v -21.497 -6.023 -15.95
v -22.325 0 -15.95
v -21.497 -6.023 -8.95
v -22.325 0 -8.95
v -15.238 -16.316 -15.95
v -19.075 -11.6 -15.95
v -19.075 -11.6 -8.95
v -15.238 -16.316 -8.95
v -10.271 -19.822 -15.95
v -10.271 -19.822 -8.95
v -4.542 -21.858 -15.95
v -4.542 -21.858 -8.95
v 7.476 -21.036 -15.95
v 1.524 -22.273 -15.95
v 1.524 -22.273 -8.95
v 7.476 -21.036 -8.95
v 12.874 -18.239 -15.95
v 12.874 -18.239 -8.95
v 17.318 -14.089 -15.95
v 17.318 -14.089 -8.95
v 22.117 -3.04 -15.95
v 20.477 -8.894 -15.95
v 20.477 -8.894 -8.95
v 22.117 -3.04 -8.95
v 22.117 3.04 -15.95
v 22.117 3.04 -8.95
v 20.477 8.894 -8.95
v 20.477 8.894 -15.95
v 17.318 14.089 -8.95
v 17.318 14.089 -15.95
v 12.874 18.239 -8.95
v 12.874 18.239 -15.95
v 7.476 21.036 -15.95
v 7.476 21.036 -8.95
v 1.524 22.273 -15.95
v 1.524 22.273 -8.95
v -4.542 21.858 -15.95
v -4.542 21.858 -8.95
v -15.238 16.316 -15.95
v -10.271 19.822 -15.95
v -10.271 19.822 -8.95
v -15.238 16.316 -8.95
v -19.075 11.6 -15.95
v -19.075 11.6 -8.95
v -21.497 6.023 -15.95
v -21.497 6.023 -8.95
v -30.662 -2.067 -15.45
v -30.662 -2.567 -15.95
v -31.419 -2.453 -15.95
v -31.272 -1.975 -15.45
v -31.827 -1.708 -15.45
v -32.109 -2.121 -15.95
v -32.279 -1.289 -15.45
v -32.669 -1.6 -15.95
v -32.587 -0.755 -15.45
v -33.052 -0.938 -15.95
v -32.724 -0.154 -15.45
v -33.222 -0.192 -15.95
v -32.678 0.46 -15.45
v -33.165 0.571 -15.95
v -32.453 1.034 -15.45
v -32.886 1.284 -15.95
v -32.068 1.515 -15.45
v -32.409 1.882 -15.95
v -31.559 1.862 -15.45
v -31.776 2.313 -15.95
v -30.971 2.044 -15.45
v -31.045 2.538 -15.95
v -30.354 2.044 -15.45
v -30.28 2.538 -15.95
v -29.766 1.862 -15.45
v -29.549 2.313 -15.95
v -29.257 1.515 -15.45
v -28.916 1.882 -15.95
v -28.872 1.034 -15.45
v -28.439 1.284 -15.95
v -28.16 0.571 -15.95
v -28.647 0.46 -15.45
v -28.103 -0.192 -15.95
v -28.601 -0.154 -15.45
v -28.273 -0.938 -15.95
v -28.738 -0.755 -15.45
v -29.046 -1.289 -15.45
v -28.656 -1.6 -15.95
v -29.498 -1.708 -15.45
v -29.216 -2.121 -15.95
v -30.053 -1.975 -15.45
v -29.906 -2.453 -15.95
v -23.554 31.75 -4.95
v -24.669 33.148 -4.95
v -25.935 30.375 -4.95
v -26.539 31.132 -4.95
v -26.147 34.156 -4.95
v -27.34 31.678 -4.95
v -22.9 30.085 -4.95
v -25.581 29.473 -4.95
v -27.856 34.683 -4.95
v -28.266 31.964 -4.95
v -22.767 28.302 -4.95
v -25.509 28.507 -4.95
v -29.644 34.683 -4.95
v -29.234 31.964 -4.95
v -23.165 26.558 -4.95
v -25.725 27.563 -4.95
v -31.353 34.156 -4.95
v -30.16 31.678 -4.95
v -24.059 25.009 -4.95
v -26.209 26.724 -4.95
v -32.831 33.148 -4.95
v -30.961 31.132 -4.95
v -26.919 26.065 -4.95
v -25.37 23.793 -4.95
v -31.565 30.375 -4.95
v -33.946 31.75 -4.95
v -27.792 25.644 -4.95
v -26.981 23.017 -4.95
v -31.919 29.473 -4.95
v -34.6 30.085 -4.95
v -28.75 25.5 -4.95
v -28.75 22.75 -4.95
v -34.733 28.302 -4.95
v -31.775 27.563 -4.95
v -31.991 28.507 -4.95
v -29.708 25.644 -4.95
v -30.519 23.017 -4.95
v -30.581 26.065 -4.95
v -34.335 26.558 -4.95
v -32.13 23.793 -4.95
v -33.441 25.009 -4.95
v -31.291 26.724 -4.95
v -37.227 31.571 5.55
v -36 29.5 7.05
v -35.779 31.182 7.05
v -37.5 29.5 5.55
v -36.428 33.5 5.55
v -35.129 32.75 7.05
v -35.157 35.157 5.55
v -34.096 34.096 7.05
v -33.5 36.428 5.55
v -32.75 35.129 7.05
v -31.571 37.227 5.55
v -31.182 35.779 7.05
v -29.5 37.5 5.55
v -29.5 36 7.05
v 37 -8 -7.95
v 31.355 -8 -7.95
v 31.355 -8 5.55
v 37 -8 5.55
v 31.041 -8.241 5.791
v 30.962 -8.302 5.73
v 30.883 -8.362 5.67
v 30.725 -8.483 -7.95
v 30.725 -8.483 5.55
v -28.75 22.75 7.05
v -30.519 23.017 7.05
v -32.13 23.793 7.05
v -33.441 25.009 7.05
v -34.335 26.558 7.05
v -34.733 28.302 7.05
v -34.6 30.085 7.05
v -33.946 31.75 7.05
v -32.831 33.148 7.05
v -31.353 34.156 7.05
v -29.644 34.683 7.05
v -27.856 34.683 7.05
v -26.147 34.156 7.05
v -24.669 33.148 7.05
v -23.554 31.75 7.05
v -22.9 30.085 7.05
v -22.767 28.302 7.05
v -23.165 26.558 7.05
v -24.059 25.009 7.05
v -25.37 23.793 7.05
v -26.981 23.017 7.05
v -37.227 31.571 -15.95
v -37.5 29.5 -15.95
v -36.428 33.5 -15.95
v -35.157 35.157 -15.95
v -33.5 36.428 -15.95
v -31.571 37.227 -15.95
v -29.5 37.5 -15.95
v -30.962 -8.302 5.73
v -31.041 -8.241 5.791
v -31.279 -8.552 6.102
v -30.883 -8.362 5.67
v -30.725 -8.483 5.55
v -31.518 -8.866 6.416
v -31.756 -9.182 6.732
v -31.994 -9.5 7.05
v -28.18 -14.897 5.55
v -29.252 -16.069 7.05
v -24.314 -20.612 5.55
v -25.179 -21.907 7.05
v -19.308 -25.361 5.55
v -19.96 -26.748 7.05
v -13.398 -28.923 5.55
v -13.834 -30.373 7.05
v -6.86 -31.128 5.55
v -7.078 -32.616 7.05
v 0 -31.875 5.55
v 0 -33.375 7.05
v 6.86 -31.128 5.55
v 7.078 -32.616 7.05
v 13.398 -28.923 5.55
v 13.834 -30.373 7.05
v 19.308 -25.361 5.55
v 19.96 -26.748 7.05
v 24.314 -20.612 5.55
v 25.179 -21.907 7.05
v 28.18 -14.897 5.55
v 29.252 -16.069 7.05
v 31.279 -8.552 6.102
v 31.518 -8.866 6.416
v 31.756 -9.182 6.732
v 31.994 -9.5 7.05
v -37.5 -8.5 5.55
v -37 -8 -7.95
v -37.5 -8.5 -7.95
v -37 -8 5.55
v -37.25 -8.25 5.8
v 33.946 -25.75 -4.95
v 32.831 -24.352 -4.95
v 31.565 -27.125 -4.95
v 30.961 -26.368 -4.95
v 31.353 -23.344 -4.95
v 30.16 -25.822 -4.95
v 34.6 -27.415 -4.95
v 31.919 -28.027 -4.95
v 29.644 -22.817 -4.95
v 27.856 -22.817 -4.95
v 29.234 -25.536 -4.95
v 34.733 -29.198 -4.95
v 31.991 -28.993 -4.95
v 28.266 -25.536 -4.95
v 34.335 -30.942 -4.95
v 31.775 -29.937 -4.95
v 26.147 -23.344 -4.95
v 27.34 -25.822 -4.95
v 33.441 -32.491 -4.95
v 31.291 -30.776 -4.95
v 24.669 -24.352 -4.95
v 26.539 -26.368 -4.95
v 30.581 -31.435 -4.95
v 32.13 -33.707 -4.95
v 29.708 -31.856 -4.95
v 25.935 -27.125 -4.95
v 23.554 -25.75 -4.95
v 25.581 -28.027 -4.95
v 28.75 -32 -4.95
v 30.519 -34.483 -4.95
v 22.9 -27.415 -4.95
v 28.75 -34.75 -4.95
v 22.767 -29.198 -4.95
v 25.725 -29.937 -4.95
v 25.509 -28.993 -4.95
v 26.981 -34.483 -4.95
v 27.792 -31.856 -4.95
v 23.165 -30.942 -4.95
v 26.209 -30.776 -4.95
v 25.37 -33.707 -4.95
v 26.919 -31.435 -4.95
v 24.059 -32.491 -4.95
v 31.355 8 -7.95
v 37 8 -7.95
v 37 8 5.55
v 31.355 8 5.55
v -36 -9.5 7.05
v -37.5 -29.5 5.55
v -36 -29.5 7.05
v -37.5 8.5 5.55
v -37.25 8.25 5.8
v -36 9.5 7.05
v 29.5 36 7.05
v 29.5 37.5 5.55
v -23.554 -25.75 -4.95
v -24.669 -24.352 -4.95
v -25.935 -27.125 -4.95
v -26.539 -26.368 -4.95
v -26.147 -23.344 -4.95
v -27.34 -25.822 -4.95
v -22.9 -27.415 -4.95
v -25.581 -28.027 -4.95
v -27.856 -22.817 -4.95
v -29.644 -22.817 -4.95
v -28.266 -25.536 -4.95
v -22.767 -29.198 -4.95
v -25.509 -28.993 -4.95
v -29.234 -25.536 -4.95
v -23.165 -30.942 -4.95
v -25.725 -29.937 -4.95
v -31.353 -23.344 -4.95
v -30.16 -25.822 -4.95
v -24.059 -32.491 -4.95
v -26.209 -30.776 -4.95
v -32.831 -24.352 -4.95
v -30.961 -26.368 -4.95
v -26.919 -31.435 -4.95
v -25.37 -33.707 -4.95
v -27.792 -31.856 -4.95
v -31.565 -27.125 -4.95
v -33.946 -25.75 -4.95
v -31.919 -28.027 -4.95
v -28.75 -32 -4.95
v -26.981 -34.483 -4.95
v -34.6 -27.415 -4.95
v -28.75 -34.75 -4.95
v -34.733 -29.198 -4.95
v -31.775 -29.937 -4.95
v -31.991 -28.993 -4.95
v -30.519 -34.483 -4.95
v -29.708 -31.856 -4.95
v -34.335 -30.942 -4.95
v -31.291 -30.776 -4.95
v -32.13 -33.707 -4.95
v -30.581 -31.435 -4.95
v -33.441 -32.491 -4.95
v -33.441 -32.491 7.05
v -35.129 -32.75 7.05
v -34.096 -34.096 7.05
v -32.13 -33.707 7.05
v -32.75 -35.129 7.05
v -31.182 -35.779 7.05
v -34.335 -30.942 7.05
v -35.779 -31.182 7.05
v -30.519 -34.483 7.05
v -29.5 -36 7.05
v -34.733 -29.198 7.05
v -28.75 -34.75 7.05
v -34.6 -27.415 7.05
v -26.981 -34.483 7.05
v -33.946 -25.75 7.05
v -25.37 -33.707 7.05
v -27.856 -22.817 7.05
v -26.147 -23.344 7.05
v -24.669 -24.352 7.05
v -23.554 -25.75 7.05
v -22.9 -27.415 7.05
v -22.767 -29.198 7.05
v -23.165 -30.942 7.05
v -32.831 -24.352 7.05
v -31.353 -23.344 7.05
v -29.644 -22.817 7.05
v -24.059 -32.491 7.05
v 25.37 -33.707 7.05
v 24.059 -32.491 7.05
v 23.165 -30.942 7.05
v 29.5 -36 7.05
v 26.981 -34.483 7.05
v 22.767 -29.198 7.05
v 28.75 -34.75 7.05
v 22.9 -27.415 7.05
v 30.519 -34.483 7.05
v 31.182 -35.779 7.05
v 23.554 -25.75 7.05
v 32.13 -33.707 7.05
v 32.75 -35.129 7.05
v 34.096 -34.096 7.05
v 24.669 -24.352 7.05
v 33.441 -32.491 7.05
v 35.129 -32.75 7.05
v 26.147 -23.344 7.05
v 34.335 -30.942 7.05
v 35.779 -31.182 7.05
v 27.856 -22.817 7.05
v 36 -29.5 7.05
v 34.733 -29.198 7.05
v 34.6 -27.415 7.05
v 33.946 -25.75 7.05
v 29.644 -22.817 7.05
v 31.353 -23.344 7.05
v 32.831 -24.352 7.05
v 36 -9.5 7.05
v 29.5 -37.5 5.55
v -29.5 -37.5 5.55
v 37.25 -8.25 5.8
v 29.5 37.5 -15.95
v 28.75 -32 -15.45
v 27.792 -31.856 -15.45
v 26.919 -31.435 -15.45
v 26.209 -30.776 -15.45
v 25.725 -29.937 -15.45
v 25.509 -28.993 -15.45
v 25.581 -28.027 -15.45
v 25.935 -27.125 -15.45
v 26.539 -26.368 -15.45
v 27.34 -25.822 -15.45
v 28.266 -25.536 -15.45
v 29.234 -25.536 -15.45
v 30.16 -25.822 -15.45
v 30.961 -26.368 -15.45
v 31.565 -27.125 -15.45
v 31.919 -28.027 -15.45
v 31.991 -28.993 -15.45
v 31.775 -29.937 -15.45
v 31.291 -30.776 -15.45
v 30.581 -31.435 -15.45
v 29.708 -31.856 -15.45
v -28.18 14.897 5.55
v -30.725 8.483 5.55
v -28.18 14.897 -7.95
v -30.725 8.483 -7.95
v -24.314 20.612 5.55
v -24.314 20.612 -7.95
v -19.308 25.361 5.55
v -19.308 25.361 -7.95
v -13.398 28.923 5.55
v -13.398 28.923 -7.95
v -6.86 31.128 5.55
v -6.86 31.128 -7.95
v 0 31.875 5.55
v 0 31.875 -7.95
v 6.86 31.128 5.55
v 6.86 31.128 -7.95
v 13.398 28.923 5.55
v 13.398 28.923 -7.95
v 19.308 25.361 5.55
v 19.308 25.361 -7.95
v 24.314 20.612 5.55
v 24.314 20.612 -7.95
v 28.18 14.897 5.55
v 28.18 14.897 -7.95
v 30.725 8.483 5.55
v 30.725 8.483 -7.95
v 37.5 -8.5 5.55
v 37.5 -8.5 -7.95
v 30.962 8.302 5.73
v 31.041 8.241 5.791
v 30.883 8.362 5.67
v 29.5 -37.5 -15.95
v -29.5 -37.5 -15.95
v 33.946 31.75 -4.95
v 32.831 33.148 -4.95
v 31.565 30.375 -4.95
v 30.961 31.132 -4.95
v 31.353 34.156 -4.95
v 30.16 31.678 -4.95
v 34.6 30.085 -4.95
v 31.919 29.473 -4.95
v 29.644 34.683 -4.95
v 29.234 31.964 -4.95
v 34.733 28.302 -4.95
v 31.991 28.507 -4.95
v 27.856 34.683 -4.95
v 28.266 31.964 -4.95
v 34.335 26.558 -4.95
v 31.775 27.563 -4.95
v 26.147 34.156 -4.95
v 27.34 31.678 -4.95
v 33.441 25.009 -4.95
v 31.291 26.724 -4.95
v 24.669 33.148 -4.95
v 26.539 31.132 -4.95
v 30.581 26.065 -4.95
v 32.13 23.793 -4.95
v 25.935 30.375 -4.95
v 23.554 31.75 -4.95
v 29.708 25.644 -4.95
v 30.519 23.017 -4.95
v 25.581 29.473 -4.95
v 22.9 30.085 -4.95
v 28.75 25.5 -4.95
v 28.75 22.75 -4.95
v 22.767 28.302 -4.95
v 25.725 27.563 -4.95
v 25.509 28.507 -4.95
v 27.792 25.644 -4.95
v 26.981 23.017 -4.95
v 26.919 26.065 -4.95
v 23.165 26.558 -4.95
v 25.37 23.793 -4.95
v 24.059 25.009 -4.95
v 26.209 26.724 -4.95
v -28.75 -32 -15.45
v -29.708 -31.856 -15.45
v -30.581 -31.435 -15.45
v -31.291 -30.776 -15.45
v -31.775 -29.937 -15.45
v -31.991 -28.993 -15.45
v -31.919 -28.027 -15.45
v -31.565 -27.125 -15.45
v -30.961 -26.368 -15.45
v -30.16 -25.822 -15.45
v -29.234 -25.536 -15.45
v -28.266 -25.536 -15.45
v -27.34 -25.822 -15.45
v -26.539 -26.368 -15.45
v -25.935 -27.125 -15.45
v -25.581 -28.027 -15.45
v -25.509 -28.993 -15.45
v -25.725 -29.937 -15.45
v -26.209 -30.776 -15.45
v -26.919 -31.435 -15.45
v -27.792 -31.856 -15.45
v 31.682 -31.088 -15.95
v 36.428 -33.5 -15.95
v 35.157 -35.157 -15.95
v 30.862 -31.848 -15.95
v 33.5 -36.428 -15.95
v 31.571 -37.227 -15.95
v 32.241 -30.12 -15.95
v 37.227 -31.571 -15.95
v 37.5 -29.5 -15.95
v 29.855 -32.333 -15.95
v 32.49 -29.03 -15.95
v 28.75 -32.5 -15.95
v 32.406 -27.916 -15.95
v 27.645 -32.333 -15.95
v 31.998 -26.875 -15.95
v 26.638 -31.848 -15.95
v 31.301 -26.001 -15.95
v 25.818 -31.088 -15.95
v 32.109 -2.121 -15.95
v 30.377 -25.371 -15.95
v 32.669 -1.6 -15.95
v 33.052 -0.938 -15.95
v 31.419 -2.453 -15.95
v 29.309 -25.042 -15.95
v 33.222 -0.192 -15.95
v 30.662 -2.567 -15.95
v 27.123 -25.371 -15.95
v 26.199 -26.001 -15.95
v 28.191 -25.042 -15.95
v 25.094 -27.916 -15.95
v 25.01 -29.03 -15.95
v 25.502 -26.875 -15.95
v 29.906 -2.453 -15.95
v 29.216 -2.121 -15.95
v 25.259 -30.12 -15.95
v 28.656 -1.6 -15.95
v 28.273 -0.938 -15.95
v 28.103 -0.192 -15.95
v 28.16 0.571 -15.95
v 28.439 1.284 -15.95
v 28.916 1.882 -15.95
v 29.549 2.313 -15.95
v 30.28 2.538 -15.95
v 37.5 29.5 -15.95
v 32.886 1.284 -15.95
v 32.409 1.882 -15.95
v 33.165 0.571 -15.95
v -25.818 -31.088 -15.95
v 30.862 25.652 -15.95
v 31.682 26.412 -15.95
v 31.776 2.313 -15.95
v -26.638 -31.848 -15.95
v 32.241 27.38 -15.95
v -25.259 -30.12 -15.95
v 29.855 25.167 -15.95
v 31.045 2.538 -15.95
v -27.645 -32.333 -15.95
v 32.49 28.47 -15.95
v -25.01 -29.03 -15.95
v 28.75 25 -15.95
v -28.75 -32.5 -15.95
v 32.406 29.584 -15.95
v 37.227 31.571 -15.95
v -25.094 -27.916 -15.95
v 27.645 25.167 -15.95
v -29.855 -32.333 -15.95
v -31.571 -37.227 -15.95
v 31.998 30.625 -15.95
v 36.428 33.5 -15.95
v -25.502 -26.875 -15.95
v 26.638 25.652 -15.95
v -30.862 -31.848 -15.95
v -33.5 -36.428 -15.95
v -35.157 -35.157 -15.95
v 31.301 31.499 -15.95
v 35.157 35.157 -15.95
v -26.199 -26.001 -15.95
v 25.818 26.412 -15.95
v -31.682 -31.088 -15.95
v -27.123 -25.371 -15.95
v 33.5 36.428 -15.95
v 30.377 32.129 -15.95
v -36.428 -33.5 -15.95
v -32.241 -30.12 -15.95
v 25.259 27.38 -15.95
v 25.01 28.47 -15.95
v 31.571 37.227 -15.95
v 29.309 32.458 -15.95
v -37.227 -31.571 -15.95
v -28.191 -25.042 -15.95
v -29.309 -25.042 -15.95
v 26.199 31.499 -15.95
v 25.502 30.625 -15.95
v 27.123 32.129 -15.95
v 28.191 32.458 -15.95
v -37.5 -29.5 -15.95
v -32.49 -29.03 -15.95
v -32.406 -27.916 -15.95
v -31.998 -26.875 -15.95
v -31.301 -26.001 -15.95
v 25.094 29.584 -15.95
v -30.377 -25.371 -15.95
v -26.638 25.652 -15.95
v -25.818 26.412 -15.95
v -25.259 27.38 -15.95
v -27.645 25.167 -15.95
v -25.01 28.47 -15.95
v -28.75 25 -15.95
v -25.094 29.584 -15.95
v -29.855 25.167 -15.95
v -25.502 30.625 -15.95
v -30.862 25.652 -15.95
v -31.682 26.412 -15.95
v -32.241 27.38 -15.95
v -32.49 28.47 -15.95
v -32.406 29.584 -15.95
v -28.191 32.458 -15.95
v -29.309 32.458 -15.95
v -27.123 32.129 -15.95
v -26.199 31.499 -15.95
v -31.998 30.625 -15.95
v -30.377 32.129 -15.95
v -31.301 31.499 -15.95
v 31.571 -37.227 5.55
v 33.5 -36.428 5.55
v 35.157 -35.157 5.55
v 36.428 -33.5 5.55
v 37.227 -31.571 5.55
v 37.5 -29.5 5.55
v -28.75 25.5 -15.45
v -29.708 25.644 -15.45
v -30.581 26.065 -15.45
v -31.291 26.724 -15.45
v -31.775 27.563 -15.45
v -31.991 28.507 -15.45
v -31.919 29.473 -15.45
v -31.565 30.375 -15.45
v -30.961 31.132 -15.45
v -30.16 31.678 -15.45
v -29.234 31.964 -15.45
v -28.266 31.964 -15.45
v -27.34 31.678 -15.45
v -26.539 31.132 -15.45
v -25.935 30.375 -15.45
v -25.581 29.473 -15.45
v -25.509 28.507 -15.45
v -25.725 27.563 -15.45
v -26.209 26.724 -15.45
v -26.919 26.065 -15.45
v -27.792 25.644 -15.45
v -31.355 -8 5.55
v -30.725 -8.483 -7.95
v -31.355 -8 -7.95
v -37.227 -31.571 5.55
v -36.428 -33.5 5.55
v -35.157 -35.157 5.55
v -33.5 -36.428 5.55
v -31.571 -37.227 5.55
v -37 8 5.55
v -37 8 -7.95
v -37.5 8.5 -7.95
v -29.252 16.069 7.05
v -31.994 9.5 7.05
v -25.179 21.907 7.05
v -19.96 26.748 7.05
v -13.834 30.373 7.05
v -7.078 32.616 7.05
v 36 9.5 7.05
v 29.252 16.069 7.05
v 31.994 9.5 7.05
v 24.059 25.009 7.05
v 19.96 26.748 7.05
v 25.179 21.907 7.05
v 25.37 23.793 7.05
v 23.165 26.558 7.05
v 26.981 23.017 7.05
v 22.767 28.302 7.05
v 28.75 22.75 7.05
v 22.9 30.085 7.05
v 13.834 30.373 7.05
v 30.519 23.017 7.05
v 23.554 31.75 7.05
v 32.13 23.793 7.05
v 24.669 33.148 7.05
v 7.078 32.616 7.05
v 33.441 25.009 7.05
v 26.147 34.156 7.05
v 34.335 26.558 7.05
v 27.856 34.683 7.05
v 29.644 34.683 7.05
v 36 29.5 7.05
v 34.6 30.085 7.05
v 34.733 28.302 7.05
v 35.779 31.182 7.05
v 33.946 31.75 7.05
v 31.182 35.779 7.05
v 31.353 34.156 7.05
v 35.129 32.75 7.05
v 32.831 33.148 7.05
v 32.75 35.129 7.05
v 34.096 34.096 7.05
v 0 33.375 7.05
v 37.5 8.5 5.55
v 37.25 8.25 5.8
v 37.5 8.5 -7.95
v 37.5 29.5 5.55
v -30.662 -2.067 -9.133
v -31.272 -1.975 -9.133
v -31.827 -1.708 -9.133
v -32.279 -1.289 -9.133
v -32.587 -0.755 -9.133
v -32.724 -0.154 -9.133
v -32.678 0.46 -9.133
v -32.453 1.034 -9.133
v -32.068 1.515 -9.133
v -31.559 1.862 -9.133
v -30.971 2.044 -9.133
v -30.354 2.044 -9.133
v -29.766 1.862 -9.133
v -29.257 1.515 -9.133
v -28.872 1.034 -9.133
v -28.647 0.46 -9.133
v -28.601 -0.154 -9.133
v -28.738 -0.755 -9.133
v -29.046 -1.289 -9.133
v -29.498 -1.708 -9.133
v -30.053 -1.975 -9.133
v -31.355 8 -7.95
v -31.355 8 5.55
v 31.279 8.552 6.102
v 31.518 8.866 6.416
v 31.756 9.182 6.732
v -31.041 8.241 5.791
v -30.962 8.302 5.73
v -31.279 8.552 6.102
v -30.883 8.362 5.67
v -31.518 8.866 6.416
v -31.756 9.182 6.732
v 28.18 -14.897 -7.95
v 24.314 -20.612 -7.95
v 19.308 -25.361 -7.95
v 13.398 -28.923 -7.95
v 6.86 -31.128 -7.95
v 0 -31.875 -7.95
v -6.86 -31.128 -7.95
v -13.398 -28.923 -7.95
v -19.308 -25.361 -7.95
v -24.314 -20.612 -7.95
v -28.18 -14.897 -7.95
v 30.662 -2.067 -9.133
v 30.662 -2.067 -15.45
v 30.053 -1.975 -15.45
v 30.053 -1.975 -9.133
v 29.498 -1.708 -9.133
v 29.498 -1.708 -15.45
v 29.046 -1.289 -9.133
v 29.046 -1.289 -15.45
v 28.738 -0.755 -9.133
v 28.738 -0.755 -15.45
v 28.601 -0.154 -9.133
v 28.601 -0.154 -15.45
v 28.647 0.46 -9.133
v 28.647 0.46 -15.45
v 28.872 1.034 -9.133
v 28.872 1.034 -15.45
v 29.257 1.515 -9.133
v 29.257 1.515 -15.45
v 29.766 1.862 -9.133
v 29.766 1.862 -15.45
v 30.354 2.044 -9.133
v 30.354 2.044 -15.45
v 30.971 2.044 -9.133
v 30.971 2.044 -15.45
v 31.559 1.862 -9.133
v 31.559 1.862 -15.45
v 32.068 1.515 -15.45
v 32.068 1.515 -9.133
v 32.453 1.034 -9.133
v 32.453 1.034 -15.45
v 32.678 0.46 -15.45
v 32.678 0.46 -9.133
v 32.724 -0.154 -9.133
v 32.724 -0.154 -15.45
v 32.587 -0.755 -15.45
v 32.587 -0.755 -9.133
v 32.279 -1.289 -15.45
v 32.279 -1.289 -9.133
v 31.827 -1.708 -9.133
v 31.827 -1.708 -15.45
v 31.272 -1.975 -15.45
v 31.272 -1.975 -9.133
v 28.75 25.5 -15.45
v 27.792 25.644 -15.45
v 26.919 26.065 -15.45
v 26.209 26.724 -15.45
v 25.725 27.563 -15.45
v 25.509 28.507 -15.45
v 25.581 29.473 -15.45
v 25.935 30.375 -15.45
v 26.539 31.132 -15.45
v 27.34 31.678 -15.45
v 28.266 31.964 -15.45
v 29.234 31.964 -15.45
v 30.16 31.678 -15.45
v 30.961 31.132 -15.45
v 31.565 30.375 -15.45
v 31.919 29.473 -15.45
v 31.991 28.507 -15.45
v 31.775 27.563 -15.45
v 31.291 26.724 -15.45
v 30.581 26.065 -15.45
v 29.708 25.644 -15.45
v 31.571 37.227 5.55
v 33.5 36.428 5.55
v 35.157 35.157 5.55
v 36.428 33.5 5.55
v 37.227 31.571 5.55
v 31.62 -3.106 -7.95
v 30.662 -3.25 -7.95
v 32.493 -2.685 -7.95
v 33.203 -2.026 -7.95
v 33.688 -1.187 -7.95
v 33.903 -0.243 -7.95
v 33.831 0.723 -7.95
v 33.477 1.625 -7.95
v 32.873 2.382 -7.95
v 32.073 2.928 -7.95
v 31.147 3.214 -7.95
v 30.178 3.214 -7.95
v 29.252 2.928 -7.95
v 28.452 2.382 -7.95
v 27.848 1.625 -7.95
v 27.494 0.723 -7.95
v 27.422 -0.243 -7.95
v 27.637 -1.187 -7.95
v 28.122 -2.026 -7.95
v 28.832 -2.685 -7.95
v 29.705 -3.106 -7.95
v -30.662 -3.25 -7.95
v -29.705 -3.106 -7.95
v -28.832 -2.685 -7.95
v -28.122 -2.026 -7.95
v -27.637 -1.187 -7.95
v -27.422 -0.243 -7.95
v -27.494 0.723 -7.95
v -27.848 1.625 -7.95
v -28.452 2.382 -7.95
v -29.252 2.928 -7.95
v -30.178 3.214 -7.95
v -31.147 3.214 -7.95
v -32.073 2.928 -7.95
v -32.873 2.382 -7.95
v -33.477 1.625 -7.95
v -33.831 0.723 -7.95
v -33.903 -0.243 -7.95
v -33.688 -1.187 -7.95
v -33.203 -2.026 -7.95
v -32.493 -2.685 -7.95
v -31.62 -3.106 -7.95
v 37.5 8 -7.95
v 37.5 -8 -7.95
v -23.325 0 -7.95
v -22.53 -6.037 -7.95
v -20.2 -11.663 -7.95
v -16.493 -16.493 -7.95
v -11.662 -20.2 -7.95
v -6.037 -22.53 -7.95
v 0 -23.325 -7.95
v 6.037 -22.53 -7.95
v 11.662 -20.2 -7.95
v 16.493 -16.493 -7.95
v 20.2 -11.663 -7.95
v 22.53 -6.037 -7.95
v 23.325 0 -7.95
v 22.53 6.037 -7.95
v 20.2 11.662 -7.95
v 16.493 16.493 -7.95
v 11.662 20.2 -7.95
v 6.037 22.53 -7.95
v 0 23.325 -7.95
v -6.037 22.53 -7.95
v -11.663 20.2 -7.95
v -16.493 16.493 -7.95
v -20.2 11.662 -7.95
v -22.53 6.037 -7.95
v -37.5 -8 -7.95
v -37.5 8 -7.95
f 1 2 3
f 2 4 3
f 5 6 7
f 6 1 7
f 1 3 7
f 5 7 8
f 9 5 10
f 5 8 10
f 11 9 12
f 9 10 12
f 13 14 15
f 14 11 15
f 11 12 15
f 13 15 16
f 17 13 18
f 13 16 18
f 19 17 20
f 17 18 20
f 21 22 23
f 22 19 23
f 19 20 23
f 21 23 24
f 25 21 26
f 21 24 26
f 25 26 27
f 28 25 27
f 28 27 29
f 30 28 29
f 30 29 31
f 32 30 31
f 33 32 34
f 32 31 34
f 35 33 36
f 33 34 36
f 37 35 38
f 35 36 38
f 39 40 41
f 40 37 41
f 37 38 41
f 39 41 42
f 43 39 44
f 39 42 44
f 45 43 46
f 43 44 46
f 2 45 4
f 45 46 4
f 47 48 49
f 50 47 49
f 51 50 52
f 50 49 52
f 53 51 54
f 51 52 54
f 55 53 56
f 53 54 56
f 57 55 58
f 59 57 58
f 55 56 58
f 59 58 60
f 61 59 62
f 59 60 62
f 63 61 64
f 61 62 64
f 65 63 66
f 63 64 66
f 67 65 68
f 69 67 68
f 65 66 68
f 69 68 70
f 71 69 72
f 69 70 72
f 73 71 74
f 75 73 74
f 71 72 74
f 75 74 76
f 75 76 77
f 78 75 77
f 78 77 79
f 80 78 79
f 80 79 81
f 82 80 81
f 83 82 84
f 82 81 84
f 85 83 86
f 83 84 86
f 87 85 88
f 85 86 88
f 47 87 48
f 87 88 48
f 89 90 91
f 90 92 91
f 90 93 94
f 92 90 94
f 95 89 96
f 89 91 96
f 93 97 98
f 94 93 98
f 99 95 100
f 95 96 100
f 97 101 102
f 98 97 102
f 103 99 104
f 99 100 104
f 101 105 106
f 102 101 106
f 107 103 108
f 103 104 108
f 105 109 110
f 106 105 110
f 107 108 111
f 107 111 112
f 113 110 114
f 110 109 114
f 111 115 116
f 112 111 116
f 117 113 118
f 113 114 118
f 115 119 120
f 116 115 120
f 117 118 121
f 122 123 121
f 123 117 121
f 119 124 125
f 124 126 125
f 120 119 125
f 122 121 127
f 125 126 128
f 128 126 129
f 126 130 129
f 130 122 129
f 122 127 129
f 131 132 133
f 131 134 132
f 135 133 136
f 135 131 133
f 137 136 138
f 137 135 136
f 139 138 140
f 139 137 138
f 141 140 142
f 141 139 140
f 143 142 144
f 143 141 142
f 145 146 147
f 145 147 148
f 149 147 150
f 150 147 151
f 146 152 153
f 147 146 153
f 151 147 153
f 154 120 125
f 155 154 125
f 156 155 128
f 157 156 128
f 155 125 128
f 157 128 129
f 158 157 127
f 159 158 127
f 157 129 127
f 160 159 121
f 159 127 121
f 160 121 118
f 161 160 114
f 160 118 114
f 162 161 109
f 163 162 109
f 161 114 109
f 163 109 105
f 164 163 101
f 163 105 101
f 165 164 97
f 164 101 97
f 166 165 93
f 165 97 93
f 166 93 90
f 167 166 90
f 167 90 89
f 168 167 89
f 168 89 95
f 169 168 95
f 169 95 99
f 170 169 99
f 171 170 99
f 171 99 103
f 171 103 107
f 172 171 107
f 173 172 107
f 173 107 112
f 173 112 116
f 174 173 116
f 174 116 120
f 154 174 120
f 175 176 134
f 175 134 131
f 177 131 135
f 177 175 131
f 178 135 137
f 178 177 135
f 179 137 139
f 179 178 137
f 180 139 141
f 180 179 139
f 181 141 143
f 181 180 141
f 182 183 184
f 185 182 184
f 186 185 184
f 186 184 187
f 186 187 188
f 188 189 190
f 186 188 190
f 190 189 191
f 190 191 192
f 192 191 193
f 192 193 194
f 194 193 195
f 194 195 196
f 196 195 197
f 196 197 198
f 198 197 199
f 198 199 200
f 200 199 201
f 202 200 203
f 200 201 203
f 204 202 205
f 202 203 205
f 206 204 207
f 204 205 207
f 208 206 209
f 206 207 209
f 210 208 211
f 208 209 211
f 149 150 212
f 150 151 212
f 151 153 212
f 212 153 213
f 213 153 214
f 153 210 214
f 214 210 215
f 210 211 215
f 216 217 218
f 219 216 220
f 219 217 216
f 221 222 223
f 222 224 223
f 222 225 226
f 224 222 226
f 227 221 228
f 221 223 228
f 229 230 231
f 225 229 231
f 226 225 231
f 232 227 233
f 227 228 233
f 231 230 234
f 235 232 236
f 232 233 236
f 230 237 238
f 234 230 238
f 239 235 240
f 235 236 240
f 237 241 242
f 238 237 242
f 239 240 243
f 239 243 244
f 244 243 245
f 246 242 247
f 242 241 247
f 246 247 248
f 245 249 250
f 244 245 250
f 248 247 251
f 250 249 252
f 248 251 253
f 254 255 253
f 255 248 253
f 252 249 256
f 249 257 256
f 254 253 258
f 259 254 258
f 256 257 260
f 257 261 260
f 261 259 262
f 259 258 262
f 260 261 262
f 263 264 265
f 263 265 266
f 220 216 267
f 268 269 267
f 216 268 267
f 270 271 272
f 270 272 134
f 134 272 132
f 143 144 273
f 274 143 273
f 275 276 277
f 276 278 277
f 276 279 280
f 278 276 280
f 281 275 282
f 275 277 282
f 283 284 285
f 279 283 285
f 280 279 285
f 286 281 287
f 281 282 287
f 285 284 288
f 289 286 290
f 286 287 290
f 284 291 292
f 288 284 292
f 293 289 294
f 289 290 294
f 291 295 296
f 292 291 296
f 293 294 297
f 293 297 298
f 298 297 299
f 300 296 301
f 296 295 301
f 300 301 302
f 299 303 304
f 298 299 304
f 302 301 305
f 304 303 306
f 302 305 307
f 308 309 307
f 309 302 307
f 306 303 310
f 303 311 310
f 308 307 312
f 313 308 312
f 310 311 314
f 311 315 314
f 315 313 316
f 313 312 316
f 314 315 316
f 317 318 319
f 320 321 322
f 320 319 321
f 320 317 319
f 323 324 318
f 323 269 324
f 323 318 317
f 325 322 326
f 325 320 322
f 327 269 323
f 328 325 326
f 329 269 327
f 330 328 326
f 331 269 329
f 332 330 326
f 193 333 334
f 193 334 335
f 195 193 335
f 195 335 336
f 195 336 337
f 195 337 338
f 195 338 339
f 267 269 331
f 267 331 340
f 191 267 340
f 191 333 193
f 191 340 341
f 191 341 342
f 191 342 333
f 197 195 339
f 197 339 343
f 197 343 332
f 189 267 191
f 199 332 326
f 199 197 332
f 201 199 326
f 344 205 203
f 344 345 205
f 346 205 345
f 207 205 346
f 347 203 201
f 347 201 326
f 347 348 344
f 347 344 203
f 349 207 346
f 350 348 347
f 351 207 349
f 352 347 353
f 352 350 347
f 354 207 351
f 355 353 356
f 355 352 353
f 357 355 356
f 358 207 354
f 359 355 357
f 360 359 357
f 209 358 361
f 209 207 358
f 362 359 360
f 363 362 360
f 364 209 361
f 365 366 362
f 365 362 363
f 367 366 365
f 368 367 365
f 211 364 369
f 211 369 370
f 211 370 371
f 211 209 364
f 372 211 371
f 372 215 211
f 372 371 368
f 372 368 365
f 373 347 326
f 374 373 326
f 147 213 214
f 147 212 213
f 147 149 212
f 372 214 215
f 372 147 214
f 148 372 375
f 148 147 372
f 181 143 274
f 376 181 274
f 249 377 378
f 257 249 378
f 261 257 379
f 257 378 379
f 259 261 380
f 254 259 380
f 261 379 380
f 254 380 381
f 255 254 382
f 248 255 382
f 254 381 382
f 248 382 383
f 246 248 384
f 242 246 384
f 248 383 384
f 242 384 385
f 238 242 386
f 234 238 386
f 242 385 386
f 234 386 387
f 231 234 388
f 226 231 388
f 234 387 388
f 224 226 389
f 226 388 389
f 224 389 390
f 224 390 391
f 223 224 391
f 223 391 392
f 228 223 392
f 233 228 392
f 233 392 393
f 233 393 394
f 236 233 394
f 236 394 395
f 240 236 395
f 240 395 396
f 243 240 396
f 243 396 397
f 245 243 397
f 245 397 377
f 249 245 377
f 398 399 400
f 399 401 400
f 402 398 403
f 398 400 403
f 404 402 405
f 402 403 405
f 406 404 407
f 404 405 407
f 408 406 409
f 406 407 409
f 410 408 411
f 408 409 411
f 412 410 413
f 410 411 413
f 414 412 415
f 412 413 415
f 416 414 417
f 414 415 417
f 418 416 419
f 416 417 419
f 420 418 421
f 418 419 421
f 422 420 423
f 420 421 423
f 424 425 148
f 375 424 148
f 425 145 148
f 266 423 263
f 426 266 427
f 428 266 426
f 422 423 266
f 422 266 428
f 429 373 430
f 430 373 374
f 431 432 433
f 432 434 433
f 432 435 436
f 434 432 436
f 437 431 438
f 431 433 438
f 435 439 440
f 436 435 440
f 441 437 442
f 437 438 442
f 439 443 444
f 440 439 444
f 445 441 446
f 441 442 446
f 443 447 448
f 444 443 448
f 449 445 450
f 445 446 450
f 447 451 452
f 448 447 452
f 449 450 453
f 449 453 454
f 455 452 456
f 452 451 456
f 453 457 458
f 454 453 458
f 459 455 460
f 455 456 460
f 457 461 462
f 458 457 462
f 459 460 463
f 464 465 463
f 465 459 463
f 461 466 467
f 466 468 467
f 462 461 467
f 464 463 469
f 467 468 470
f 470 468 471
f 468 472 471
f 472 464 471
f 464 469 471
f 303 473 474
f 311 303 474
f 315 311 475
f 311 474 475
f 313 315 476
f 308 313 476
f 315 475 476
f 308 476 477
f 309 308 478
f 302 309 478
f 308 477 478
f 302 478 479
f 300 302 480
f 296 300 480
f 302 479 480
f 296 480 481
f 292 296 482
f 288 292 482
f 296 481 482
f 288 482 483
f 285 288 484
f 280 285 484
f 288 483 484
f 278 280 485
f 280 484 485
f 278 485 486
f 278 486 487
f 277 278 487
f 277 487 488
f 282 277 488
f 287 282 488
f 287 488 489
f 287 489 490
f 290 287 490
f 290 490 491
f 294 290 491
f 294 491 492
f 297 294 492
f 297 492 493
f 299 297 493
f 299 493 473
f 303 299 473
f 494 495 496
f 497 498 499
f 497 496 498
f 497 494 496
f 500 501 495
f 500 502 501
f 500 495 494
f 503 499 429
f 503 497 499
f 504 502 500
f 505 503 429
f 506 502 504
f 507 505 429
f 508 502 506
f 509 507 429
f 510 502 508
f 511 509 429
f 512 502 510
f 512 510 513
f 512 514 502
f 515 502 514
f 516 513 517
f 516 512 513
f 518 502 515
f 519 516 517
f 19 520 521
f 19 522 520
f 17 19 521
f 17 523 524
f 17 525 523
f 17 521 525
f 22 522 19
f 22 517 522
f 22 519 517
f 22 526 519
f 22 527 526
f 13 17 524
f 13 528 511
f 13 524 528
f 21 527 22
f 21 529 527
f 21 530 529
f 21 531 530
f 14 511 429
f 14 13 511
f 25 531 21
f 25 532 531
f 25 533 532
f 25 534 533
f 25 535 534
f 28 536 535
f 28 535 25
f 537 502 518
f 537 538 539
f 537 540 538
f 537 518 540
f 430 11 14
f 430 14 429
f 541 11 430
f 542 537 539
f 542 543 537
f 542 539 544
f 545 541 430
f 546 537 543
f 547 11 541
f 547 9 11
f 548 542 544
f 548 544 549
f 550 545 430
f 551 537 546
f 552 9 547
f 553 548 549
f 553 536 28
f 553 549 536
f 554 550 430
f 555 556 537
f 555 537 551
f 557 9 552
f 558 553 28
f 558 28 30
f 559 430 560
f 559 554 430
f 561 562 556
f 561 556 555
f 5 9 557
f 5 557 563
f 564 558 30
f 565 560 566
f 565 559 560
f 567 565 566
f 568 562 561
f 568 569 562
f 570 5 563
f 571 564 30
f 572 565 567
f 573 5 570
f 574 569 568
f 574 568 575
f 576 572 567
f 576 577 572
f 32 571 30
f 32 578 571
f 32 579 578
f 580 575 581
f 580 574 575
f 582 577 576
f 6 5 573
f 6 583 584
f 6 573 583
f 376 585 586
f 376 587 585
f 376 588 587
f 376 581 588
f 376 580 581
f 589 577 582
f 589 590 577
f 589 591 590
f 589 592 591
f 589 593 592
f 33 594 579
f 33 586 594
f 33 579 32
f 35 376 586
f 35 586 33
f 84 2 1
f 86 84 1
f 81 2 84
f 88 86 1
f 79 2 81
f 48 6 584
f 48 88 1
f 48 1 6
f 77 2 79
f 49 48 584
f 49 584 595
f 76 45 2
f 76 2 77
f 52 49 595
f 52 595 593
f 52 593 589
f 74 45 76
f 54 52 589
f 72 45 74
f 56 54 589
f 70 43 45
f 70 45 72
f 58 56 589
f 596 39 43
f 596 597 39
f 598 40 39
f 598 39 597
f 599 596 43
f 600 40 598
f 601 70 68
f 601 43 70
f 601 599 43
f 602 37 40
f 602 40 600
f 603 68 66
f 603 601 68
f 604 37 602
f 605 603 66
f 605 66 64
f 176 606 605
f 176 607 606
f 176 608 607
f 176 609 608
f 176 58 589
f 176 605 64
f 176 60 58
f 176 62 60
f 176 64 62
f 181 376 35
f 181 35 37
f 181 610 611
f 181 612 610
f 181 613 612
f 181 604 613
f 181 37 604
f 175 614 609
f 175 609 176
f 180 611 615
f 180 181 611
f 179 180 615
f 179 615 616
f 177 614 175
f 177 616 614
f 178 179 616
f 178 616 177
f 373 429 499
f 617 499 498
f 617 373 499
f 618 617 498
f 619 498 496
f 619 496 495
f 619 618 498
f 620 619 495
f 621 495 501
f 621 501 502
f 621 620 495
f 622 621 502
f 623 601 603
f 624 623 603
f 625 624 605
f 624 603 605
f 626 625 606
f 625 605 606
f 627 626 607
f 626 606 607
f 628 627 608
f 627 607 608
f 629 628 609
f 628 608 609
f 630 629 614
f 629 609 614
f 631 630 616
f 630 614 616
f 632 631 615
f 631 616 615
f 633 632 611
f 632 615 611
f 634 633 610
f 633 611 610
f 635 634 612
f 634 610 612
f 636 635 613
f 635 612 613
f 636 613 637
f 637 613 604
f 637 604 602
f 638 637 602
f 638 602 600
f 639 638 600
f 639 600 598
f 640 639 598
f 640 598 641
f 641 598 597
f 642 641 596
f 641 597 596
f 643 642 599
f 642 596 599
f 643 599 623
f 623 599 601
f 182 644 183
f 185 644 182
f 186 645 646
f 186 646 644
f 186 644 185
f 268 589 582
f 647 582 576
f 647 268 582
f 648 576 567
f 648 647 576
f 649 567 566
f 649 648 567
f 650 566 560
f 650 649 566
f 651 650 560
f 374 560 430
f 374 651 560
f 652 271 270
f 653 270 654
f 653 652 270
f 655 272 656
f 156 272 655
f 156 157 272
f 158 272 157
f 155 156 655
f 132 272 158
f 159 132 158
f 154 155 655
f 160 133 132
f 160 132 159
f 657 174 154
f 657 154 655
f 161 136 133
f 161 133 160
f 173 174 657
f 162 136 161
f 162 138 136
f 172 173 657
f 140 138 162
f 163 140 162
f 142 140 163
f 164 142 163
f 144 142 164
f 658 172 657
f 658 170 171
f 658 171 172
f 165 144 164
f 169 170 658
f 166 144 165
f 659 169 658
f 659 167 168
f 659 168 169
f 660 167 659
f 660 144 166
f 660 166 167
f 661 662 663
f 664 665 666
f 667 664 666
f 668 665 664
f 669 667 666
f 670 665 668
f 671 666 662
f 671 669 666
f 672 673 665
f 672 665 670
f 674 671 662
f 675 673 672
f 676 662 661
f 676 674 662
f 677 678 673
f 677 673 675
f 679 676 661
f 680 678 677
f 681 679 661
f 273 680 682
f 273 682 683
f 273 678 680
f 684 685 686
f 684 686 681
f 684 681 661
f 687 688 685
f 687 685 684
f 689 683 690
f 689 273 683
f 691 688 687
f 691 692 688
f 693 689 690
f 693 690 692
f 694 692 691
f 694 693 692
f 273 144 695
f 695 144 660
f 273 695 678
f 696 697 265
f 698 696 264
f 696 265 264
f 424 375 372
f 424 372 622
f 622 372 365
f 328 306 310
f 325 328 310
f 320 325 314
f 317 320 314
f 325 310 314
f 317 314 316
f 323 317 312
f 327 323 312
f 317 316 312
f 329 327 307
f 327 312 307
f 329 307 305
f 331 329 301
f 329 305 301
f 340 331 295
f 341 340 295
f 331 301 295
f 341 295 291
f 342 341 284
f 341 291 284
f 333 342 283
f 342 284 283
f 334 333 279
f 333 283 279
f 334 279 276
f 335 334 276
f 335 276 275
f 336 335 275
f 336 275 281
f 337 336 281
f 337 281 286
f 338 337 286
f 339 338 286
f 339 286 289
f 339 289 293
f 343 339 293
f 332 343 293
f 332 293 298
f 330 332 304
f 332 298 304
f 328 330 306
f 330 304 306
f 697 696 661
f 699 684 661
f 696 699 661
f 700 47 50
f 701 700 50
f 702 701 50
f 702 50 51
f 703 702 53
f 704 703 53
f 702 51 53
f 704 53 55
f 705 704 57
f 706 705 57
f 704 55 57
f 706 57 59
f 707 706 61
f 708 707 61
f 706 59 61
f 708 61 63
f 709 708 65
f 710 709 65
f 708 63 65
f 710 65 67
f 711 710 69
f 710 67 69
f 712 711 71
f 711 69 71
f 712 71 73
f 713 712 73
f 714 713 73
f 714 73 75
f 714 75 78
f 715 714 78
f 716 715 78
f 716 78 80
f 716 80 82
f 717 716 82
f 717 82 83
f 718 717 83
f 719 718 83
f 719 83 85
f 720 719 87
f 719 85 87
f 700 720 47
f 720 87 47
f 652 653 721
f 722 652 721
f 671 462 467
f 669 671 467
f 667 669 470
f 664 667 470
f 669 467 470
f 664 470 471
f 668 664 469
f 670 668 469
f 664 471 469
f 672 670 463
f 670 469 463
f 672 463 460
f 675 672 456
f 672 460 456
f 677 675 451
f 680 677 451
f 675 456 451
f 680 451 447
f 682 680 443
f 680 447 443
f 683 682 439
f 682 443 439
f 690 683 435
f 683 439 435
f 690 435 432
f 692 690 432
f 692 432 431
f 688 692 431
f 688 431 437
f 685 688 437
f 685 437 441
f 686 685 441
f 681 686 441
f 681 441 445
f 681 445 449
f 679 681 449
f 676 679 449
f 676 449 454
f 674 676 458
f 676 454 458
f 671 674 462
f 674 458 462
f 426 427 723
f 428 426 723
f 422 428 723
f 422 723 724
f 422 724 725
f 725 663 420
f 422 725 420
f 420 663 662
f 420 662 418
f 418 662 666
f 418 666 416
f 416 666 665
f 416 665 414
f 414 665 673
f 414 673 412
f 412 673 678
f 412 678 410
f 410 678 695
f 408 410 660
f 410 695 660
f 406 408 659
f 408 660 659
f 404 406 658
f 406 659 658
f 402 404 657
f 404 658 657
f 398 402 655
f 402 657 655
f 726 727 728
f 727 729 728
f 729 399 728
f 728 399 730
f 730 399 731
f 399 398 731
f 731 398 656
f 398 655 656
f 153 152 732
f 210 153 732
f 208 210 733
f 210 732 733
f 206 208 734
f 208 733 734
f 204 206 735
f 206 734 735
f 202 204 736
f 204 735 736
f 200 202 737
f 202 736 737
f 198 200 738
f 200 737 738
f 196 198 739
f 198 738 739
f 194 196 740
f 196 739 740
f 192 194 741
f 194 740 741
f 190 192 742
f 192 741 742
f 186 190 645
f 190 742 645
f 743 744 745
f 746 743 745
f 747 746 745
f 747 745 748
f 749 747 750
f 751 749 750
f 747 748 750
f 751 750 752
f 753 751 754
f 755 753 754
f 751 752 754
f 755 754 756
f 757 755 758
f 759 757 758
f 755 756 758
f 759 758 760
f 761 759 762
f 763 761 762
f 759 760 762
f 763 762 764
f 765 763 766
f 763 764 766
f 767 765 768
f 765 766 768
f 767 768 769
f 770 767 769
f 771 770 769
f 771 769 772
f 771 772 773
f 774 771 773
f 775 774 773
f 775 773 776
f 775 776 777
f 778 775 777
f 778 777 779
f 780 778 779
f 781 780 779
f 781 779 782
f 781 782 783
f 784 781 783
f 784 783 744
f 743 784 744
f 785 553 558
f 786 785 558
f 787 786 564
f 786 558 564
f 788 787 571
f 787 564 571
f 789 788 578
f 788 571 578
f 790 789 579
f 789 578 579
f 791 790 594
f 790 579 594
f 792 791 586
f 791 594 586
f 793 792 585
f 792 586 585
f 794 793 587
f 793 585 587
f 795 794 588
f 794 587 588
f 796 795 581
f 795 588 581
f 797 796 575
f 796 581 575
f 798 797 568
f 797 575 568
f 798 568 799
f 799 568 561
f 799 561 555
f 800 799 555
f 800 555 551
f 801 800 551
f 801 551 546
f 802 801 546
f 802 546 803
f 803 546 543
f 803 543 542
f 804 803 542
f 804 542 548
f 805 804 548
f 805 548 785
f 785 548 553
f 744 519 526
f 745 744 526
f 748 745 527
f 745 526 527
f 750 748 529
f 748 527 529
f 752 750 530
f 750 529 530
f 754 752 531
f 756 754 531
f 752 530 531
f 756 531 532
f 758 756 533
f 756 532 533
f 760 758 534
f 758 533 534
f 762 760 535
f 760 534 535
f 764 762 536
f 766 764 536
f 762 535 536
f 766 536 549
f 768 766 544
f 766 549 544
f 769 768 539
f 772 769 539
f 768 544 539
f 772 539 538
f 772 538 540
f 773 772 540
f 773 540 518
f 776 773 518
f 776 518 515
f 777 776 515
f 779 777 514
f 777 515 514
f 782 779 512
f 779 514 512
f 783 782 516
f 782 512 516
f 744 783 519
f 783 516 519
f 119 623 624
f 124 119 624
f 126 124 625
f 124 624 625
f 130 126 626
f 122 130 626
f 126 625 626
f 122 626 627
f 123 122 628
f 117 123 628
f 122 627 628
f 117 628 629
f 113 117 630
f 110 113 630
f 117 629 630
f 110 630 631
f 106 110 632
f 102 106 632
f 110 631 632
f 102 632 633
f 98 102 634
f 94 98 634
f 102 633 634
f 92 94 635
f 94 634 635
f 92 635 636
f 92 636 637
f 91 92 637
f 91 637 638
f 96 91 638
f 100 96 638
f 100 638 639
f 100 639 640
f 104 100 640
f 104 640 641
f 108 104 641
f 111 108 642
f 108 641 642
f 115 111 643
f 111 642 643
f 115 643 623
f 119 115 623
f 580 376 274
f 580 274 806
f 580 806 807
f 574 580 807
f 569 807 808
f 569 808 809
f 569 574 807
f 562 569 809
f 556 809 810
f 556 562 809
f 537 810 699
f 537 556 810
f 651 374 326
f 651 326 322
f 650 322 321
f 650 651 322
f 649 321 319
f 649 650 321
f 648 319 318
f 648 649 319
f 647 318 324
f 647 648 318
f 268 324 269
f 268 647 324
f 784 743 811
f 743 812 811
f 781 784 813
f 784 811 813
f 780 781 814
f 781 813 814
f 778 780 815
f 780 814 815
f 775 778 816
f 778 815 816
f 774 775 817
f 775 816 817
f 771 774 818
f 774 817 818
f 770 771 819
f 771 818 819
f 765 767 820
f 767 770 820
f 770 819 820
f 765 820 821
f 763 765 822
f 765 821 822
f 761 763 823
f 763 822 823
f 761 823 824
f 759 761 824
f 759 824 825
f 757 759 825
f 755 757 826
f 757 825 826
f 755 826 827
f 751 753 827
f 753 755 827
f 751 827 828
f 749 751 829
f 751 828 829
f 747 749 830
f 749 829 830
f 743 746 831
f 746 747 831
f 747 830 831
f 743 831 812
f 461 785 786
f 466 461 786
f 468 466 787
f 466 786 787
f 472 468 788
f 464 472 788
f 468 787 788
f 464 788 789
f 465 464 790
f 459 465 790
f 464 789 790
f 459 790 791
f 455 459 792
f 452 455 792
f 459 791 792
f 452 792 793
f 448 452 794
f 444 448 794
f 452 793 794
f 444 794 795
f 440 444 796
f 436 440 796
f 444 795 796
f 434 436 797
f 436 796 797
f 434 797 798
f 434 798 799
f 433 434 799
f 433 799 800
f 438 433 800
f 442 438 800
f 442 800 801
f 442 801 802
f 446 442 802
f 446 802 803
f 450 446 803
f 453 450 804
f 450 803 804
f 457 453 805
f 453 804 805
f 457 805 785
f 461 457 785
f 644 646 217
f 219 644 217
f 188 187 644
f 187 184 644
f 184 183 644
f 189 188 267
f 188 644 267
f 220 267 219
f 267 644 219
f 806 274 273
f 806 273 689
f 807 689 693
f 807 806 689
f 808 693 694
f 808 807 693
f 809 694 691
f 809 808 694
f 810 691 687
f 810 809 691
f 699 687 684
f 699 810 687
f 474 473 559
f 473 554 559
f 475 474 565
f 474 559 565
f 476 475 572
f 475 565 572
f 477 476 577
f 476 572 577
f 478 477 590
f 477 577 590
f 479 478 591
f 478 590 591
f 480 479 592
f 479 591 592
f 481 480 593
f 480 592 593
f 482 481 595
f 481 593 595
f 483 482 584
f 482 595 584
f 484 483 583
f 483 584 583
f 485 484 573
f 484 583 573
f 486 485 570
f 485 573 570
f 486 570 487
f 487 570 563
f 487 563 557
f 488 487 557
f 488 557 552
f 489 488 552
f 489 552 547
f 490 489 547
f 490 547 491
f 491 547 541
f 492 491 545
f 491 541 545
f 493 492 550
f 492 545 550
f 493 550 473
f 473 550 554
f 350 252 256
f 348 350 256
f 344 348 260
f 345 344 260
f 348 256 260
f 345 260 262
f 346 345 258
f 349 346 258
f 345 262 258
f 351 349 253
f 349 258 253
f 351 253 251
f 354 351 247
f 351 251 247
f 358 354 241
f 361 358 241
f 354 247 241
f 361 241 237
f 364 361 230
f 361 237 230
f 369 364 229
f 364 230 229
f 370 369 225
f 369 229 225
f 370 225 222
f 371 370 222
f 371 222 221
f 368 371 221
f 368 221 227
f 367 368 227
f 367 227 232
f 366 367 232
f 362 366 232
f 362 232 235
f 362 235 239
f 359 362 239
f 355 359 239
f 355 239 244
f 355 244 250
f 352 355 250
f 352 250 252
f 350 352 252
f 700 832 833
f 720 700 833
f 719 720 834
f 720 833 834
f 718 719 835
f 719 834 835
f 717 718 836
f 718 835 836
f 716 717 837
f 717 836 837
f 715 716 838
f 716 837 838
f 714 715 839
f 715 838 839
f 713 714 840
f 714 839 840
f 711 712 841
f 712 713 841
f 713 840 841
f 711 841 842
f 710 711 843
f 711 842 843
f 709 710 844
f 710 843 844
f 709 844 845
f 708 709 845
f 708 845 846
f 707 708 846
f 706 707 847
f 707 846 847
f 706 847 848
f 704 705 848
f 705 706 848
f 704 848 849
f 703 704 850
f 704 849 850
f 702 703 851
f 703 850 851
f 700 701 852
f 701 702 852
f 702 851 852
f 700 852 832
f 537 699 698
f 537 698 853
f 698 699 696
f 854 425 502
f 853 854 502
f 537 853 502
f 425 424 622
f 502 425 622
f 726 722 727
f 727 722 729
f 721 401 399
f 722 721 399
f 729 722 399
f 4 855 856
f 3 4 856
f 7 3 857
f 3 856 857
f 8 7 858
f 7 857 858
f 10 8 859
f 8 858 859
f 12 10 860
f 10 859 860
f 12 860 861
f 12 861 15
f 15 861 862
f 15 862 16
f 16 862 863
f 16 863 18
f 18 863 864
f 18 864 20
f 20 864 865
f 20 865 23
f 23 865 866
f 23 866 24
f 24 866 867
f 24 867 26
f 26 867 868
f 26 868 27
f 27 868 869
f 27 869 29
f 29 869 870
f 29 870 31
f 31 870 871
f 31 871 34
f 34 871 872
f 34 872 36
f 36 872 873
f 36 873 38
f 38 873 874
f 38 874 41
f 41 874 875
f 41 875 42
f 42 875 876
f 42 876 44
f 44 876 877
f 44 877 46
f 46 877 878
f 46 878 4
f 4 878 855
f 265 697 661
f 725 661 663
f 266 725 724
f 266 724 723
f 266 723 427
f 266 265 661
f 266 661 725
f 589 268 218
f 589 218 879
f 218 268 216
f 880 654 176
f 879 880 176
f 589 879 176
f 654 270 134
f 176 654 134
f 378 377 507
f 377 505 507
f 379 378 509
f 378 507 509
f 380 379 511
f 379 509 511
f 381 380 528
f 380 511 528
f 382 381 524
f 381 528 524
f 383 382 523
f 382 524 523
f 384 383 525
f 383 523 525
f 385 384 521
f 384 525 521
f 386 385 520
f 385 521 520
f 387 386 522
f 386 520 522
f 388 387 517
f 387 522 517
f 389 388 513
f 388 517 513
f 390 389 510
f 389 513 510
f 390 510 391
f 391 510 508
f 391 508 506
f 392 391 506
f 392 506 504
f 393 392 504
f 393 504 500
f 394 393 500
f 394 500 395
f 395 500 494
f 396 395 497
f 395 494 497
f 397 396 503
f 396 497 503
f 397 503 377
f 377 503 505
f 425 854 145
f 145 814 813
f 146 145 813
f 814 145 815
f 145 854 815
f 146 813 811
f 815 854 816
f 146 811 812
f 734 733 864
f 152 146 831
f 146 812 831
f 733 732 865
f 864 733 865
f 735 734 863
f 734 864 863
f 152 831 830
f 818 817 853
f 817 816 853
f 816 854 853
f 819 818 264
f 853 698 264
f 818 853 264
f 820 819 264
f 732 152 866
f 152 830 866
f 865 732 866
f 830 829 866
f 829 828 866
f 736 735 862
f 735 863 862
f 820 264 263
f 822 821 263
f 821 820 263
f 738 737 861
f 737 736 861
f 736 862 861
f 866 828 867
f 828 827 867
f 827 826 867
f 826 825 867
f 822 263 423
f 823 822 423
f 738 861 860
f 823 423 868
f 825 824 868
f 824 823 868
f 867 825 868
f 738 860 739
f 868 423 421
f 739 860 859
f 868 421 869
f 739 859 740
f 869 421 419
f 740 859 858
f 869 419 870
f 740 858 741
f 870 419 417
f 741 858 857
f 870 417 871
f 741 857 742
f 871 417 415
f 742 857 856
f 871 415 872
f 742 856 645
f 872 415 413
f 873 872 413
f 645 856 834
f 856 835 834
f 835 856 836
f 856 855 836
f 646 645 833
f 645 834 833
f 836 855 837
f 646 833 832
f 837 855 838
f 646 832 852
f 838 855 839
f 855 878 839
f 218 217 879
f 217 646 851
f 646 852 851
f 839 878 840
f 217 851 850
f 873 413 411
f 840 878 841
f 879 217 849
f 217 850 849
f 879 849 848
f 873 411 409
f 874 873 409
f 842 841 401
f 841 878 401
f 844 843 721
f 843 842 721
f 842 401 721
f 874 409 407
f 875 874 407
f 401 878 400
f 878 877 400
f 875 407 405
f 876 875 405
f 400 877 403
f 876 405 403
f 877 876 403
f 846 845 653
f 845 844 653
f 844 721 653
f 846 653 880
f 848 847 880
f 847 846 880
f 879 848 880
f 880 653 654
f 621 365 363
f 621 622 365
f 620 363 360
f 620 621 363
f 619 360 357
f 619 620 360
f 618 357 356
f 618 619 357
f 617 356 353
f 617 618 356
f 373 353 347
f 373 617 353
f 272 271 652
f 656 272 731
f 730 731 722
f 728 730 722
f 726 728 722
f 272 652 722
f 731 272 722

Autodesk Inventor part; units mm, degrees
ref_plane "YZ Plane" through (0, 0, 0) normal (1, 0, 0) x (0, 1, 0)
ref_plane "XZ Plane" through (0, 0, 0) normal (0, 1, 0) x (-1, 0, 0)
ref_plane "Work Plane1" through (31.775, 0, -7.95) normal (0, 0, -1) x (-1, 0, 0)
sketch "Sketch1" plane through (31.775, 0, -7.95) normal (0, 0, -1) x (-1, 0, 0)
  line L0 (62.5134, -8.05) -> (55.6, -8.05) construction
  line L1 (55.6, -8.05) -> (55.6, 8.05) construction
  line L2 (55.6, 8.05) -> (62.5134, 8.05) construction
  arc A0 (62.5134, 8.05) -> (1.0366, 8.05) centre (31.775, 0) ccw construction
  line L3 (1.0366, 8.05) -> (7.95, 8.05) construction
  line L4 (7.95, 8.05) -> (7.95, -8.05) construction
  line L5 (7.95, -8.05) -> (1.0366, -8.05) construction
  arc A1 (1.0366, -8.05) -> (62.5134, -8.05) centre (31.775, 0) ccw construction
  circle A2 centre (31.775, 0) radius 22.225 construction
  circle A3 centre (31.775, 0) radius 22.325
  line L6 (69.275, 37.5) -> (-5.725, 37.5)
  line L7 (-5.725, 37.5) -> (-5.725, -37.5)
  line L8 (-5.725, -37.5) -> (69.275, -37.5)
  line L9 (69.275, -37.5) -> (69.275, 37.5)
  line L10 (69.275, 37.5) -> (-5.725, -37.5) construction
  line L11 (-5.725, 37.5) -> (69.275, -37.5) construction
  dimension "d0" = 0.1
  dimension "d1" = 44.65
  dimension "d2" = 75
extrude "Extrusion1" add sketch "Sketch1" along normal blind 8
sketch "Sketch2" plane through (31.775, 0, -7.95) normal (0, 0, 1) x (1, 0, 0)
  line L0 (-62.5134, -8.05) -> (-55.6, -8.05) construction
  line L1 (-55.6, -8.05) -> (-55.6, 8.05) construction
  line L2 (-55.6, 8.05) -> (-62.5134, 8.05) construction
  arc A0 (-1.0366, 8.05) -> (-62.5134, 8.05) centre (-31.775, 0) ccw construction
  line L3 (-1.0366, 8.05) -> (-7.95, 8.05) construction
  line L4 (-7.95, 8.05) -> (-7.95, -8.05) construction
  line L5 (-7.95, -8.05) -> (-1.0366, -8.05) construction
  arc A1 (-62.5134, -8.05) -> (-1.0366, -8.05) centre (-31.775, 0) ccw construction
  circle A2 centre (-31.775, 0) radius 22.225 construction
  line L6 (5.725, 37.5) -> (5.725, -37.5) projected
  line L7 (-69.275, 37.5) -> (5.725, 37.5) projected
  line L8 (-69.275, -37.5) -> (-69.275, 37.5) projected
  line L9 (5.725, -37.5) -> (-69.275, -37.5) projected
  circle A3 centre (-31.775, 0) radius 22.325 construction
  circle A4 centre (-31.775, 0) radius 31.875
  line L10 (-55.6, -8) -> (-69.275, -8)
  line L11 (-69.275, -8) -> (-69.275, 8)
  line L12 (-69.275, 8) -> (-55.6, 8)
  line L13 (-55.6, 8) -> (-55.6, -8)
  line L14 (-84.275, 0) -> (20.725, 0) construction
  line L15 (-31.775, -52.5) -> (-31.775, 52.5) construction
  line L16 (-1.0366, -8.05) -> (-7.95, -8.05) construction
  line L17 (-7.95, -8.05) -> (-7.95, 8.05) construction
  line L18 (-7.95, 8.05) -> (-1.0366, 8.05) construction
  line L19 (-7.95, -8) -> (5.725, -8)
  line L20 (5.725, -8) -> (5.725, 8)
  line L21 (5.725, 8) -> (-7.95, 8)
  line L22 (-7.95, 8) -> (-7.95, -8)
  point P0 (-62.6298, 8)
  point P1 (-62.6298, -8)
  point P2 (-0.9202, 8)
  point P3 (5.725, 8)
  point P4 (5.725, -8)
  point P5 (-0.9202, -8)
  dimension "d7" = 0.1
  dimension "d9" = 0
  dimension "d29" = 0.05
extrude "Extrusion2" add sketch "Sketch2" along normal blind 15 contours L6 L21 A4 L12 L8 L7 | L6 L9 L8 L10 A4 L19
sketch "Sketch3" plane through (31.775, 0, 7.05) normal (0, 0, 1) x (1, 0, 0)
  line L0 (-3.025, -28.75) -> (-60.525, -28.75)
  line L1 (-60.525, -28.75) -> (-60.525, 28.75)
  line L2 (-60.525, 28.75) -> (-3.025, 28.75)
  line L3 (-3.025, 28.75) -> (-3.025, -28.75)
  line L4 (-3.025, -28.75) -> (-60.525, 28.75) construction
  line L5 (-60.525, -28.75) -> (-3.025, 28.75) construction
  point P0 (-31.775, 0)
  dimension "d12" = 57.5
hole "Hole1" at (-28.75, 28.75, 7.05) at (28.75, 28.75, 7.05) at (28.75, -28.75, 7.05) at (-28.75, -28.75, 7.05) direction (0, 0, -1) diameter 6.5 end through all counterbore diameter 12 counterbore depth 12
sketch "Sketch4" plane through (31.775, 0, -7.95) normal (0, 0, 1) x (1, 0, 0)
  circle A0 centre (-31.775, 0) radius 22.325 construction
  line L0 (5.725, 8) -> (-0.9202, 8) construction
  arc A1 (-0.9202, 8) -> (-62.6298, 8) centre (-31.775, 0) ccw construction
  line L1 (-62.6298, 8) -> (-69.275, 8) construction
  line L2 (-69.275, -8) -> (-69.275, 8) construction
  line L3 (-69.275, -8) -> (-62.6298, -8) construction
  arc A2 (-62.6298, -8) -> (-0.9202, -8) centre (-31.775, 0) ccw construction
  line L4 (-0.9202, -8) -> (5.725, -8) construction
  line L5 (5.725, 8) -> (5.725, -8) construction
  line L6 (5.725, 8) -> (-7.95, 8) construction
  line L7 (-7.95, -8) -> (5.725, -8) construction
  line L8 (5.725, -8) -> (5.725, 8) construction
  line L9 (-31.775, 0) -> (-9.45, 0) construction
  line L10 (-9.45, 0) -> (5.725, 0) construction
  line L11 (-1.1125, 8) -> (-1.1125, -8) construction
  line L12 (-0.9202, -8) -> (5.725, -8) construction
  line L13 (-31.775, -52.5) -> (-31.775, 52.5) construction
  line L14 (-7.95, -8) -> (-7.95, 8)
  line L15 (-7.95, 8.05) -> (-7.95, -8.05) projected
  point P0 (-1.1125, 0)
  point P1 (-62.4375, 0)
  dimension "d28" = 0
hole "Hole2" at (30.6625, 0, -7.95) at (-30.6625, 0, -7.95) direction (0, 0, -1) diameter 4.134 end through all countersink diameter 6.5 countersink angle 90 thread size "M5x0.8" class "6H" standard "ISO Metric profile"
fillet "Fillet1" radius 8 4 edges at (-37.5, -37.5, -4.45) (-37.5, 37.5, -4.45) (37.5, 37.5, -4.45) (37.5, -37.5, -4.45)
chamfer "Chamfer1" distance 1.5 angle 45 16 edges at (0, 31.875, 7.05) (0, -31.875, 7.05) (34.1774, 8, 7.05) (-34.1774, 8, 7.05) (-34.1774, -8, 7.05) (-37.5, -18.75, 7.05) (-35.1569, -35.1569, 7.05) (0, -37.5, 7.05) (35.1569, -35.1569, 7.05) (37.5, -18.75, 7.05) (-37.5, 18.75, 7.05) (-35.1569, 35.1569, 7.05) (0, 37.5, 7.05) (35.1569, 35.1569, 7.05) (37.5, 18.75, 7.05) (34.1774, -8, 7.05)
chamfer "Chamfer2" distance 1 angle 45 1 edges at (22.325, 0, -7.95)
chamfer "Chamfer3" distance 0.5 angle 45 6 edges at (30.6625, 2.067, -15.95) (-30.6625, 2.067, -15.95) (28.75, -25.5, -15.95) (-28.75, -25.5, -15.95) (28.75, 32, -15.95) (-28.75, 32, -15.95)
chamfer "Chamfer5" distance 0.5 angle 45 8 edges at (-30.8548, 8, -1.2) (30.8548, 8, -1.2) (-30.8548, -8, -1.2) (30.8548, -8, -1.2) (-37.5, 8, -1.2) (37.5, 8, -1.2) (37.5, -8, -1.2) (-37.5, -8, -1.2)
properties part number "TH1-001" material "Aluminum 6061"
